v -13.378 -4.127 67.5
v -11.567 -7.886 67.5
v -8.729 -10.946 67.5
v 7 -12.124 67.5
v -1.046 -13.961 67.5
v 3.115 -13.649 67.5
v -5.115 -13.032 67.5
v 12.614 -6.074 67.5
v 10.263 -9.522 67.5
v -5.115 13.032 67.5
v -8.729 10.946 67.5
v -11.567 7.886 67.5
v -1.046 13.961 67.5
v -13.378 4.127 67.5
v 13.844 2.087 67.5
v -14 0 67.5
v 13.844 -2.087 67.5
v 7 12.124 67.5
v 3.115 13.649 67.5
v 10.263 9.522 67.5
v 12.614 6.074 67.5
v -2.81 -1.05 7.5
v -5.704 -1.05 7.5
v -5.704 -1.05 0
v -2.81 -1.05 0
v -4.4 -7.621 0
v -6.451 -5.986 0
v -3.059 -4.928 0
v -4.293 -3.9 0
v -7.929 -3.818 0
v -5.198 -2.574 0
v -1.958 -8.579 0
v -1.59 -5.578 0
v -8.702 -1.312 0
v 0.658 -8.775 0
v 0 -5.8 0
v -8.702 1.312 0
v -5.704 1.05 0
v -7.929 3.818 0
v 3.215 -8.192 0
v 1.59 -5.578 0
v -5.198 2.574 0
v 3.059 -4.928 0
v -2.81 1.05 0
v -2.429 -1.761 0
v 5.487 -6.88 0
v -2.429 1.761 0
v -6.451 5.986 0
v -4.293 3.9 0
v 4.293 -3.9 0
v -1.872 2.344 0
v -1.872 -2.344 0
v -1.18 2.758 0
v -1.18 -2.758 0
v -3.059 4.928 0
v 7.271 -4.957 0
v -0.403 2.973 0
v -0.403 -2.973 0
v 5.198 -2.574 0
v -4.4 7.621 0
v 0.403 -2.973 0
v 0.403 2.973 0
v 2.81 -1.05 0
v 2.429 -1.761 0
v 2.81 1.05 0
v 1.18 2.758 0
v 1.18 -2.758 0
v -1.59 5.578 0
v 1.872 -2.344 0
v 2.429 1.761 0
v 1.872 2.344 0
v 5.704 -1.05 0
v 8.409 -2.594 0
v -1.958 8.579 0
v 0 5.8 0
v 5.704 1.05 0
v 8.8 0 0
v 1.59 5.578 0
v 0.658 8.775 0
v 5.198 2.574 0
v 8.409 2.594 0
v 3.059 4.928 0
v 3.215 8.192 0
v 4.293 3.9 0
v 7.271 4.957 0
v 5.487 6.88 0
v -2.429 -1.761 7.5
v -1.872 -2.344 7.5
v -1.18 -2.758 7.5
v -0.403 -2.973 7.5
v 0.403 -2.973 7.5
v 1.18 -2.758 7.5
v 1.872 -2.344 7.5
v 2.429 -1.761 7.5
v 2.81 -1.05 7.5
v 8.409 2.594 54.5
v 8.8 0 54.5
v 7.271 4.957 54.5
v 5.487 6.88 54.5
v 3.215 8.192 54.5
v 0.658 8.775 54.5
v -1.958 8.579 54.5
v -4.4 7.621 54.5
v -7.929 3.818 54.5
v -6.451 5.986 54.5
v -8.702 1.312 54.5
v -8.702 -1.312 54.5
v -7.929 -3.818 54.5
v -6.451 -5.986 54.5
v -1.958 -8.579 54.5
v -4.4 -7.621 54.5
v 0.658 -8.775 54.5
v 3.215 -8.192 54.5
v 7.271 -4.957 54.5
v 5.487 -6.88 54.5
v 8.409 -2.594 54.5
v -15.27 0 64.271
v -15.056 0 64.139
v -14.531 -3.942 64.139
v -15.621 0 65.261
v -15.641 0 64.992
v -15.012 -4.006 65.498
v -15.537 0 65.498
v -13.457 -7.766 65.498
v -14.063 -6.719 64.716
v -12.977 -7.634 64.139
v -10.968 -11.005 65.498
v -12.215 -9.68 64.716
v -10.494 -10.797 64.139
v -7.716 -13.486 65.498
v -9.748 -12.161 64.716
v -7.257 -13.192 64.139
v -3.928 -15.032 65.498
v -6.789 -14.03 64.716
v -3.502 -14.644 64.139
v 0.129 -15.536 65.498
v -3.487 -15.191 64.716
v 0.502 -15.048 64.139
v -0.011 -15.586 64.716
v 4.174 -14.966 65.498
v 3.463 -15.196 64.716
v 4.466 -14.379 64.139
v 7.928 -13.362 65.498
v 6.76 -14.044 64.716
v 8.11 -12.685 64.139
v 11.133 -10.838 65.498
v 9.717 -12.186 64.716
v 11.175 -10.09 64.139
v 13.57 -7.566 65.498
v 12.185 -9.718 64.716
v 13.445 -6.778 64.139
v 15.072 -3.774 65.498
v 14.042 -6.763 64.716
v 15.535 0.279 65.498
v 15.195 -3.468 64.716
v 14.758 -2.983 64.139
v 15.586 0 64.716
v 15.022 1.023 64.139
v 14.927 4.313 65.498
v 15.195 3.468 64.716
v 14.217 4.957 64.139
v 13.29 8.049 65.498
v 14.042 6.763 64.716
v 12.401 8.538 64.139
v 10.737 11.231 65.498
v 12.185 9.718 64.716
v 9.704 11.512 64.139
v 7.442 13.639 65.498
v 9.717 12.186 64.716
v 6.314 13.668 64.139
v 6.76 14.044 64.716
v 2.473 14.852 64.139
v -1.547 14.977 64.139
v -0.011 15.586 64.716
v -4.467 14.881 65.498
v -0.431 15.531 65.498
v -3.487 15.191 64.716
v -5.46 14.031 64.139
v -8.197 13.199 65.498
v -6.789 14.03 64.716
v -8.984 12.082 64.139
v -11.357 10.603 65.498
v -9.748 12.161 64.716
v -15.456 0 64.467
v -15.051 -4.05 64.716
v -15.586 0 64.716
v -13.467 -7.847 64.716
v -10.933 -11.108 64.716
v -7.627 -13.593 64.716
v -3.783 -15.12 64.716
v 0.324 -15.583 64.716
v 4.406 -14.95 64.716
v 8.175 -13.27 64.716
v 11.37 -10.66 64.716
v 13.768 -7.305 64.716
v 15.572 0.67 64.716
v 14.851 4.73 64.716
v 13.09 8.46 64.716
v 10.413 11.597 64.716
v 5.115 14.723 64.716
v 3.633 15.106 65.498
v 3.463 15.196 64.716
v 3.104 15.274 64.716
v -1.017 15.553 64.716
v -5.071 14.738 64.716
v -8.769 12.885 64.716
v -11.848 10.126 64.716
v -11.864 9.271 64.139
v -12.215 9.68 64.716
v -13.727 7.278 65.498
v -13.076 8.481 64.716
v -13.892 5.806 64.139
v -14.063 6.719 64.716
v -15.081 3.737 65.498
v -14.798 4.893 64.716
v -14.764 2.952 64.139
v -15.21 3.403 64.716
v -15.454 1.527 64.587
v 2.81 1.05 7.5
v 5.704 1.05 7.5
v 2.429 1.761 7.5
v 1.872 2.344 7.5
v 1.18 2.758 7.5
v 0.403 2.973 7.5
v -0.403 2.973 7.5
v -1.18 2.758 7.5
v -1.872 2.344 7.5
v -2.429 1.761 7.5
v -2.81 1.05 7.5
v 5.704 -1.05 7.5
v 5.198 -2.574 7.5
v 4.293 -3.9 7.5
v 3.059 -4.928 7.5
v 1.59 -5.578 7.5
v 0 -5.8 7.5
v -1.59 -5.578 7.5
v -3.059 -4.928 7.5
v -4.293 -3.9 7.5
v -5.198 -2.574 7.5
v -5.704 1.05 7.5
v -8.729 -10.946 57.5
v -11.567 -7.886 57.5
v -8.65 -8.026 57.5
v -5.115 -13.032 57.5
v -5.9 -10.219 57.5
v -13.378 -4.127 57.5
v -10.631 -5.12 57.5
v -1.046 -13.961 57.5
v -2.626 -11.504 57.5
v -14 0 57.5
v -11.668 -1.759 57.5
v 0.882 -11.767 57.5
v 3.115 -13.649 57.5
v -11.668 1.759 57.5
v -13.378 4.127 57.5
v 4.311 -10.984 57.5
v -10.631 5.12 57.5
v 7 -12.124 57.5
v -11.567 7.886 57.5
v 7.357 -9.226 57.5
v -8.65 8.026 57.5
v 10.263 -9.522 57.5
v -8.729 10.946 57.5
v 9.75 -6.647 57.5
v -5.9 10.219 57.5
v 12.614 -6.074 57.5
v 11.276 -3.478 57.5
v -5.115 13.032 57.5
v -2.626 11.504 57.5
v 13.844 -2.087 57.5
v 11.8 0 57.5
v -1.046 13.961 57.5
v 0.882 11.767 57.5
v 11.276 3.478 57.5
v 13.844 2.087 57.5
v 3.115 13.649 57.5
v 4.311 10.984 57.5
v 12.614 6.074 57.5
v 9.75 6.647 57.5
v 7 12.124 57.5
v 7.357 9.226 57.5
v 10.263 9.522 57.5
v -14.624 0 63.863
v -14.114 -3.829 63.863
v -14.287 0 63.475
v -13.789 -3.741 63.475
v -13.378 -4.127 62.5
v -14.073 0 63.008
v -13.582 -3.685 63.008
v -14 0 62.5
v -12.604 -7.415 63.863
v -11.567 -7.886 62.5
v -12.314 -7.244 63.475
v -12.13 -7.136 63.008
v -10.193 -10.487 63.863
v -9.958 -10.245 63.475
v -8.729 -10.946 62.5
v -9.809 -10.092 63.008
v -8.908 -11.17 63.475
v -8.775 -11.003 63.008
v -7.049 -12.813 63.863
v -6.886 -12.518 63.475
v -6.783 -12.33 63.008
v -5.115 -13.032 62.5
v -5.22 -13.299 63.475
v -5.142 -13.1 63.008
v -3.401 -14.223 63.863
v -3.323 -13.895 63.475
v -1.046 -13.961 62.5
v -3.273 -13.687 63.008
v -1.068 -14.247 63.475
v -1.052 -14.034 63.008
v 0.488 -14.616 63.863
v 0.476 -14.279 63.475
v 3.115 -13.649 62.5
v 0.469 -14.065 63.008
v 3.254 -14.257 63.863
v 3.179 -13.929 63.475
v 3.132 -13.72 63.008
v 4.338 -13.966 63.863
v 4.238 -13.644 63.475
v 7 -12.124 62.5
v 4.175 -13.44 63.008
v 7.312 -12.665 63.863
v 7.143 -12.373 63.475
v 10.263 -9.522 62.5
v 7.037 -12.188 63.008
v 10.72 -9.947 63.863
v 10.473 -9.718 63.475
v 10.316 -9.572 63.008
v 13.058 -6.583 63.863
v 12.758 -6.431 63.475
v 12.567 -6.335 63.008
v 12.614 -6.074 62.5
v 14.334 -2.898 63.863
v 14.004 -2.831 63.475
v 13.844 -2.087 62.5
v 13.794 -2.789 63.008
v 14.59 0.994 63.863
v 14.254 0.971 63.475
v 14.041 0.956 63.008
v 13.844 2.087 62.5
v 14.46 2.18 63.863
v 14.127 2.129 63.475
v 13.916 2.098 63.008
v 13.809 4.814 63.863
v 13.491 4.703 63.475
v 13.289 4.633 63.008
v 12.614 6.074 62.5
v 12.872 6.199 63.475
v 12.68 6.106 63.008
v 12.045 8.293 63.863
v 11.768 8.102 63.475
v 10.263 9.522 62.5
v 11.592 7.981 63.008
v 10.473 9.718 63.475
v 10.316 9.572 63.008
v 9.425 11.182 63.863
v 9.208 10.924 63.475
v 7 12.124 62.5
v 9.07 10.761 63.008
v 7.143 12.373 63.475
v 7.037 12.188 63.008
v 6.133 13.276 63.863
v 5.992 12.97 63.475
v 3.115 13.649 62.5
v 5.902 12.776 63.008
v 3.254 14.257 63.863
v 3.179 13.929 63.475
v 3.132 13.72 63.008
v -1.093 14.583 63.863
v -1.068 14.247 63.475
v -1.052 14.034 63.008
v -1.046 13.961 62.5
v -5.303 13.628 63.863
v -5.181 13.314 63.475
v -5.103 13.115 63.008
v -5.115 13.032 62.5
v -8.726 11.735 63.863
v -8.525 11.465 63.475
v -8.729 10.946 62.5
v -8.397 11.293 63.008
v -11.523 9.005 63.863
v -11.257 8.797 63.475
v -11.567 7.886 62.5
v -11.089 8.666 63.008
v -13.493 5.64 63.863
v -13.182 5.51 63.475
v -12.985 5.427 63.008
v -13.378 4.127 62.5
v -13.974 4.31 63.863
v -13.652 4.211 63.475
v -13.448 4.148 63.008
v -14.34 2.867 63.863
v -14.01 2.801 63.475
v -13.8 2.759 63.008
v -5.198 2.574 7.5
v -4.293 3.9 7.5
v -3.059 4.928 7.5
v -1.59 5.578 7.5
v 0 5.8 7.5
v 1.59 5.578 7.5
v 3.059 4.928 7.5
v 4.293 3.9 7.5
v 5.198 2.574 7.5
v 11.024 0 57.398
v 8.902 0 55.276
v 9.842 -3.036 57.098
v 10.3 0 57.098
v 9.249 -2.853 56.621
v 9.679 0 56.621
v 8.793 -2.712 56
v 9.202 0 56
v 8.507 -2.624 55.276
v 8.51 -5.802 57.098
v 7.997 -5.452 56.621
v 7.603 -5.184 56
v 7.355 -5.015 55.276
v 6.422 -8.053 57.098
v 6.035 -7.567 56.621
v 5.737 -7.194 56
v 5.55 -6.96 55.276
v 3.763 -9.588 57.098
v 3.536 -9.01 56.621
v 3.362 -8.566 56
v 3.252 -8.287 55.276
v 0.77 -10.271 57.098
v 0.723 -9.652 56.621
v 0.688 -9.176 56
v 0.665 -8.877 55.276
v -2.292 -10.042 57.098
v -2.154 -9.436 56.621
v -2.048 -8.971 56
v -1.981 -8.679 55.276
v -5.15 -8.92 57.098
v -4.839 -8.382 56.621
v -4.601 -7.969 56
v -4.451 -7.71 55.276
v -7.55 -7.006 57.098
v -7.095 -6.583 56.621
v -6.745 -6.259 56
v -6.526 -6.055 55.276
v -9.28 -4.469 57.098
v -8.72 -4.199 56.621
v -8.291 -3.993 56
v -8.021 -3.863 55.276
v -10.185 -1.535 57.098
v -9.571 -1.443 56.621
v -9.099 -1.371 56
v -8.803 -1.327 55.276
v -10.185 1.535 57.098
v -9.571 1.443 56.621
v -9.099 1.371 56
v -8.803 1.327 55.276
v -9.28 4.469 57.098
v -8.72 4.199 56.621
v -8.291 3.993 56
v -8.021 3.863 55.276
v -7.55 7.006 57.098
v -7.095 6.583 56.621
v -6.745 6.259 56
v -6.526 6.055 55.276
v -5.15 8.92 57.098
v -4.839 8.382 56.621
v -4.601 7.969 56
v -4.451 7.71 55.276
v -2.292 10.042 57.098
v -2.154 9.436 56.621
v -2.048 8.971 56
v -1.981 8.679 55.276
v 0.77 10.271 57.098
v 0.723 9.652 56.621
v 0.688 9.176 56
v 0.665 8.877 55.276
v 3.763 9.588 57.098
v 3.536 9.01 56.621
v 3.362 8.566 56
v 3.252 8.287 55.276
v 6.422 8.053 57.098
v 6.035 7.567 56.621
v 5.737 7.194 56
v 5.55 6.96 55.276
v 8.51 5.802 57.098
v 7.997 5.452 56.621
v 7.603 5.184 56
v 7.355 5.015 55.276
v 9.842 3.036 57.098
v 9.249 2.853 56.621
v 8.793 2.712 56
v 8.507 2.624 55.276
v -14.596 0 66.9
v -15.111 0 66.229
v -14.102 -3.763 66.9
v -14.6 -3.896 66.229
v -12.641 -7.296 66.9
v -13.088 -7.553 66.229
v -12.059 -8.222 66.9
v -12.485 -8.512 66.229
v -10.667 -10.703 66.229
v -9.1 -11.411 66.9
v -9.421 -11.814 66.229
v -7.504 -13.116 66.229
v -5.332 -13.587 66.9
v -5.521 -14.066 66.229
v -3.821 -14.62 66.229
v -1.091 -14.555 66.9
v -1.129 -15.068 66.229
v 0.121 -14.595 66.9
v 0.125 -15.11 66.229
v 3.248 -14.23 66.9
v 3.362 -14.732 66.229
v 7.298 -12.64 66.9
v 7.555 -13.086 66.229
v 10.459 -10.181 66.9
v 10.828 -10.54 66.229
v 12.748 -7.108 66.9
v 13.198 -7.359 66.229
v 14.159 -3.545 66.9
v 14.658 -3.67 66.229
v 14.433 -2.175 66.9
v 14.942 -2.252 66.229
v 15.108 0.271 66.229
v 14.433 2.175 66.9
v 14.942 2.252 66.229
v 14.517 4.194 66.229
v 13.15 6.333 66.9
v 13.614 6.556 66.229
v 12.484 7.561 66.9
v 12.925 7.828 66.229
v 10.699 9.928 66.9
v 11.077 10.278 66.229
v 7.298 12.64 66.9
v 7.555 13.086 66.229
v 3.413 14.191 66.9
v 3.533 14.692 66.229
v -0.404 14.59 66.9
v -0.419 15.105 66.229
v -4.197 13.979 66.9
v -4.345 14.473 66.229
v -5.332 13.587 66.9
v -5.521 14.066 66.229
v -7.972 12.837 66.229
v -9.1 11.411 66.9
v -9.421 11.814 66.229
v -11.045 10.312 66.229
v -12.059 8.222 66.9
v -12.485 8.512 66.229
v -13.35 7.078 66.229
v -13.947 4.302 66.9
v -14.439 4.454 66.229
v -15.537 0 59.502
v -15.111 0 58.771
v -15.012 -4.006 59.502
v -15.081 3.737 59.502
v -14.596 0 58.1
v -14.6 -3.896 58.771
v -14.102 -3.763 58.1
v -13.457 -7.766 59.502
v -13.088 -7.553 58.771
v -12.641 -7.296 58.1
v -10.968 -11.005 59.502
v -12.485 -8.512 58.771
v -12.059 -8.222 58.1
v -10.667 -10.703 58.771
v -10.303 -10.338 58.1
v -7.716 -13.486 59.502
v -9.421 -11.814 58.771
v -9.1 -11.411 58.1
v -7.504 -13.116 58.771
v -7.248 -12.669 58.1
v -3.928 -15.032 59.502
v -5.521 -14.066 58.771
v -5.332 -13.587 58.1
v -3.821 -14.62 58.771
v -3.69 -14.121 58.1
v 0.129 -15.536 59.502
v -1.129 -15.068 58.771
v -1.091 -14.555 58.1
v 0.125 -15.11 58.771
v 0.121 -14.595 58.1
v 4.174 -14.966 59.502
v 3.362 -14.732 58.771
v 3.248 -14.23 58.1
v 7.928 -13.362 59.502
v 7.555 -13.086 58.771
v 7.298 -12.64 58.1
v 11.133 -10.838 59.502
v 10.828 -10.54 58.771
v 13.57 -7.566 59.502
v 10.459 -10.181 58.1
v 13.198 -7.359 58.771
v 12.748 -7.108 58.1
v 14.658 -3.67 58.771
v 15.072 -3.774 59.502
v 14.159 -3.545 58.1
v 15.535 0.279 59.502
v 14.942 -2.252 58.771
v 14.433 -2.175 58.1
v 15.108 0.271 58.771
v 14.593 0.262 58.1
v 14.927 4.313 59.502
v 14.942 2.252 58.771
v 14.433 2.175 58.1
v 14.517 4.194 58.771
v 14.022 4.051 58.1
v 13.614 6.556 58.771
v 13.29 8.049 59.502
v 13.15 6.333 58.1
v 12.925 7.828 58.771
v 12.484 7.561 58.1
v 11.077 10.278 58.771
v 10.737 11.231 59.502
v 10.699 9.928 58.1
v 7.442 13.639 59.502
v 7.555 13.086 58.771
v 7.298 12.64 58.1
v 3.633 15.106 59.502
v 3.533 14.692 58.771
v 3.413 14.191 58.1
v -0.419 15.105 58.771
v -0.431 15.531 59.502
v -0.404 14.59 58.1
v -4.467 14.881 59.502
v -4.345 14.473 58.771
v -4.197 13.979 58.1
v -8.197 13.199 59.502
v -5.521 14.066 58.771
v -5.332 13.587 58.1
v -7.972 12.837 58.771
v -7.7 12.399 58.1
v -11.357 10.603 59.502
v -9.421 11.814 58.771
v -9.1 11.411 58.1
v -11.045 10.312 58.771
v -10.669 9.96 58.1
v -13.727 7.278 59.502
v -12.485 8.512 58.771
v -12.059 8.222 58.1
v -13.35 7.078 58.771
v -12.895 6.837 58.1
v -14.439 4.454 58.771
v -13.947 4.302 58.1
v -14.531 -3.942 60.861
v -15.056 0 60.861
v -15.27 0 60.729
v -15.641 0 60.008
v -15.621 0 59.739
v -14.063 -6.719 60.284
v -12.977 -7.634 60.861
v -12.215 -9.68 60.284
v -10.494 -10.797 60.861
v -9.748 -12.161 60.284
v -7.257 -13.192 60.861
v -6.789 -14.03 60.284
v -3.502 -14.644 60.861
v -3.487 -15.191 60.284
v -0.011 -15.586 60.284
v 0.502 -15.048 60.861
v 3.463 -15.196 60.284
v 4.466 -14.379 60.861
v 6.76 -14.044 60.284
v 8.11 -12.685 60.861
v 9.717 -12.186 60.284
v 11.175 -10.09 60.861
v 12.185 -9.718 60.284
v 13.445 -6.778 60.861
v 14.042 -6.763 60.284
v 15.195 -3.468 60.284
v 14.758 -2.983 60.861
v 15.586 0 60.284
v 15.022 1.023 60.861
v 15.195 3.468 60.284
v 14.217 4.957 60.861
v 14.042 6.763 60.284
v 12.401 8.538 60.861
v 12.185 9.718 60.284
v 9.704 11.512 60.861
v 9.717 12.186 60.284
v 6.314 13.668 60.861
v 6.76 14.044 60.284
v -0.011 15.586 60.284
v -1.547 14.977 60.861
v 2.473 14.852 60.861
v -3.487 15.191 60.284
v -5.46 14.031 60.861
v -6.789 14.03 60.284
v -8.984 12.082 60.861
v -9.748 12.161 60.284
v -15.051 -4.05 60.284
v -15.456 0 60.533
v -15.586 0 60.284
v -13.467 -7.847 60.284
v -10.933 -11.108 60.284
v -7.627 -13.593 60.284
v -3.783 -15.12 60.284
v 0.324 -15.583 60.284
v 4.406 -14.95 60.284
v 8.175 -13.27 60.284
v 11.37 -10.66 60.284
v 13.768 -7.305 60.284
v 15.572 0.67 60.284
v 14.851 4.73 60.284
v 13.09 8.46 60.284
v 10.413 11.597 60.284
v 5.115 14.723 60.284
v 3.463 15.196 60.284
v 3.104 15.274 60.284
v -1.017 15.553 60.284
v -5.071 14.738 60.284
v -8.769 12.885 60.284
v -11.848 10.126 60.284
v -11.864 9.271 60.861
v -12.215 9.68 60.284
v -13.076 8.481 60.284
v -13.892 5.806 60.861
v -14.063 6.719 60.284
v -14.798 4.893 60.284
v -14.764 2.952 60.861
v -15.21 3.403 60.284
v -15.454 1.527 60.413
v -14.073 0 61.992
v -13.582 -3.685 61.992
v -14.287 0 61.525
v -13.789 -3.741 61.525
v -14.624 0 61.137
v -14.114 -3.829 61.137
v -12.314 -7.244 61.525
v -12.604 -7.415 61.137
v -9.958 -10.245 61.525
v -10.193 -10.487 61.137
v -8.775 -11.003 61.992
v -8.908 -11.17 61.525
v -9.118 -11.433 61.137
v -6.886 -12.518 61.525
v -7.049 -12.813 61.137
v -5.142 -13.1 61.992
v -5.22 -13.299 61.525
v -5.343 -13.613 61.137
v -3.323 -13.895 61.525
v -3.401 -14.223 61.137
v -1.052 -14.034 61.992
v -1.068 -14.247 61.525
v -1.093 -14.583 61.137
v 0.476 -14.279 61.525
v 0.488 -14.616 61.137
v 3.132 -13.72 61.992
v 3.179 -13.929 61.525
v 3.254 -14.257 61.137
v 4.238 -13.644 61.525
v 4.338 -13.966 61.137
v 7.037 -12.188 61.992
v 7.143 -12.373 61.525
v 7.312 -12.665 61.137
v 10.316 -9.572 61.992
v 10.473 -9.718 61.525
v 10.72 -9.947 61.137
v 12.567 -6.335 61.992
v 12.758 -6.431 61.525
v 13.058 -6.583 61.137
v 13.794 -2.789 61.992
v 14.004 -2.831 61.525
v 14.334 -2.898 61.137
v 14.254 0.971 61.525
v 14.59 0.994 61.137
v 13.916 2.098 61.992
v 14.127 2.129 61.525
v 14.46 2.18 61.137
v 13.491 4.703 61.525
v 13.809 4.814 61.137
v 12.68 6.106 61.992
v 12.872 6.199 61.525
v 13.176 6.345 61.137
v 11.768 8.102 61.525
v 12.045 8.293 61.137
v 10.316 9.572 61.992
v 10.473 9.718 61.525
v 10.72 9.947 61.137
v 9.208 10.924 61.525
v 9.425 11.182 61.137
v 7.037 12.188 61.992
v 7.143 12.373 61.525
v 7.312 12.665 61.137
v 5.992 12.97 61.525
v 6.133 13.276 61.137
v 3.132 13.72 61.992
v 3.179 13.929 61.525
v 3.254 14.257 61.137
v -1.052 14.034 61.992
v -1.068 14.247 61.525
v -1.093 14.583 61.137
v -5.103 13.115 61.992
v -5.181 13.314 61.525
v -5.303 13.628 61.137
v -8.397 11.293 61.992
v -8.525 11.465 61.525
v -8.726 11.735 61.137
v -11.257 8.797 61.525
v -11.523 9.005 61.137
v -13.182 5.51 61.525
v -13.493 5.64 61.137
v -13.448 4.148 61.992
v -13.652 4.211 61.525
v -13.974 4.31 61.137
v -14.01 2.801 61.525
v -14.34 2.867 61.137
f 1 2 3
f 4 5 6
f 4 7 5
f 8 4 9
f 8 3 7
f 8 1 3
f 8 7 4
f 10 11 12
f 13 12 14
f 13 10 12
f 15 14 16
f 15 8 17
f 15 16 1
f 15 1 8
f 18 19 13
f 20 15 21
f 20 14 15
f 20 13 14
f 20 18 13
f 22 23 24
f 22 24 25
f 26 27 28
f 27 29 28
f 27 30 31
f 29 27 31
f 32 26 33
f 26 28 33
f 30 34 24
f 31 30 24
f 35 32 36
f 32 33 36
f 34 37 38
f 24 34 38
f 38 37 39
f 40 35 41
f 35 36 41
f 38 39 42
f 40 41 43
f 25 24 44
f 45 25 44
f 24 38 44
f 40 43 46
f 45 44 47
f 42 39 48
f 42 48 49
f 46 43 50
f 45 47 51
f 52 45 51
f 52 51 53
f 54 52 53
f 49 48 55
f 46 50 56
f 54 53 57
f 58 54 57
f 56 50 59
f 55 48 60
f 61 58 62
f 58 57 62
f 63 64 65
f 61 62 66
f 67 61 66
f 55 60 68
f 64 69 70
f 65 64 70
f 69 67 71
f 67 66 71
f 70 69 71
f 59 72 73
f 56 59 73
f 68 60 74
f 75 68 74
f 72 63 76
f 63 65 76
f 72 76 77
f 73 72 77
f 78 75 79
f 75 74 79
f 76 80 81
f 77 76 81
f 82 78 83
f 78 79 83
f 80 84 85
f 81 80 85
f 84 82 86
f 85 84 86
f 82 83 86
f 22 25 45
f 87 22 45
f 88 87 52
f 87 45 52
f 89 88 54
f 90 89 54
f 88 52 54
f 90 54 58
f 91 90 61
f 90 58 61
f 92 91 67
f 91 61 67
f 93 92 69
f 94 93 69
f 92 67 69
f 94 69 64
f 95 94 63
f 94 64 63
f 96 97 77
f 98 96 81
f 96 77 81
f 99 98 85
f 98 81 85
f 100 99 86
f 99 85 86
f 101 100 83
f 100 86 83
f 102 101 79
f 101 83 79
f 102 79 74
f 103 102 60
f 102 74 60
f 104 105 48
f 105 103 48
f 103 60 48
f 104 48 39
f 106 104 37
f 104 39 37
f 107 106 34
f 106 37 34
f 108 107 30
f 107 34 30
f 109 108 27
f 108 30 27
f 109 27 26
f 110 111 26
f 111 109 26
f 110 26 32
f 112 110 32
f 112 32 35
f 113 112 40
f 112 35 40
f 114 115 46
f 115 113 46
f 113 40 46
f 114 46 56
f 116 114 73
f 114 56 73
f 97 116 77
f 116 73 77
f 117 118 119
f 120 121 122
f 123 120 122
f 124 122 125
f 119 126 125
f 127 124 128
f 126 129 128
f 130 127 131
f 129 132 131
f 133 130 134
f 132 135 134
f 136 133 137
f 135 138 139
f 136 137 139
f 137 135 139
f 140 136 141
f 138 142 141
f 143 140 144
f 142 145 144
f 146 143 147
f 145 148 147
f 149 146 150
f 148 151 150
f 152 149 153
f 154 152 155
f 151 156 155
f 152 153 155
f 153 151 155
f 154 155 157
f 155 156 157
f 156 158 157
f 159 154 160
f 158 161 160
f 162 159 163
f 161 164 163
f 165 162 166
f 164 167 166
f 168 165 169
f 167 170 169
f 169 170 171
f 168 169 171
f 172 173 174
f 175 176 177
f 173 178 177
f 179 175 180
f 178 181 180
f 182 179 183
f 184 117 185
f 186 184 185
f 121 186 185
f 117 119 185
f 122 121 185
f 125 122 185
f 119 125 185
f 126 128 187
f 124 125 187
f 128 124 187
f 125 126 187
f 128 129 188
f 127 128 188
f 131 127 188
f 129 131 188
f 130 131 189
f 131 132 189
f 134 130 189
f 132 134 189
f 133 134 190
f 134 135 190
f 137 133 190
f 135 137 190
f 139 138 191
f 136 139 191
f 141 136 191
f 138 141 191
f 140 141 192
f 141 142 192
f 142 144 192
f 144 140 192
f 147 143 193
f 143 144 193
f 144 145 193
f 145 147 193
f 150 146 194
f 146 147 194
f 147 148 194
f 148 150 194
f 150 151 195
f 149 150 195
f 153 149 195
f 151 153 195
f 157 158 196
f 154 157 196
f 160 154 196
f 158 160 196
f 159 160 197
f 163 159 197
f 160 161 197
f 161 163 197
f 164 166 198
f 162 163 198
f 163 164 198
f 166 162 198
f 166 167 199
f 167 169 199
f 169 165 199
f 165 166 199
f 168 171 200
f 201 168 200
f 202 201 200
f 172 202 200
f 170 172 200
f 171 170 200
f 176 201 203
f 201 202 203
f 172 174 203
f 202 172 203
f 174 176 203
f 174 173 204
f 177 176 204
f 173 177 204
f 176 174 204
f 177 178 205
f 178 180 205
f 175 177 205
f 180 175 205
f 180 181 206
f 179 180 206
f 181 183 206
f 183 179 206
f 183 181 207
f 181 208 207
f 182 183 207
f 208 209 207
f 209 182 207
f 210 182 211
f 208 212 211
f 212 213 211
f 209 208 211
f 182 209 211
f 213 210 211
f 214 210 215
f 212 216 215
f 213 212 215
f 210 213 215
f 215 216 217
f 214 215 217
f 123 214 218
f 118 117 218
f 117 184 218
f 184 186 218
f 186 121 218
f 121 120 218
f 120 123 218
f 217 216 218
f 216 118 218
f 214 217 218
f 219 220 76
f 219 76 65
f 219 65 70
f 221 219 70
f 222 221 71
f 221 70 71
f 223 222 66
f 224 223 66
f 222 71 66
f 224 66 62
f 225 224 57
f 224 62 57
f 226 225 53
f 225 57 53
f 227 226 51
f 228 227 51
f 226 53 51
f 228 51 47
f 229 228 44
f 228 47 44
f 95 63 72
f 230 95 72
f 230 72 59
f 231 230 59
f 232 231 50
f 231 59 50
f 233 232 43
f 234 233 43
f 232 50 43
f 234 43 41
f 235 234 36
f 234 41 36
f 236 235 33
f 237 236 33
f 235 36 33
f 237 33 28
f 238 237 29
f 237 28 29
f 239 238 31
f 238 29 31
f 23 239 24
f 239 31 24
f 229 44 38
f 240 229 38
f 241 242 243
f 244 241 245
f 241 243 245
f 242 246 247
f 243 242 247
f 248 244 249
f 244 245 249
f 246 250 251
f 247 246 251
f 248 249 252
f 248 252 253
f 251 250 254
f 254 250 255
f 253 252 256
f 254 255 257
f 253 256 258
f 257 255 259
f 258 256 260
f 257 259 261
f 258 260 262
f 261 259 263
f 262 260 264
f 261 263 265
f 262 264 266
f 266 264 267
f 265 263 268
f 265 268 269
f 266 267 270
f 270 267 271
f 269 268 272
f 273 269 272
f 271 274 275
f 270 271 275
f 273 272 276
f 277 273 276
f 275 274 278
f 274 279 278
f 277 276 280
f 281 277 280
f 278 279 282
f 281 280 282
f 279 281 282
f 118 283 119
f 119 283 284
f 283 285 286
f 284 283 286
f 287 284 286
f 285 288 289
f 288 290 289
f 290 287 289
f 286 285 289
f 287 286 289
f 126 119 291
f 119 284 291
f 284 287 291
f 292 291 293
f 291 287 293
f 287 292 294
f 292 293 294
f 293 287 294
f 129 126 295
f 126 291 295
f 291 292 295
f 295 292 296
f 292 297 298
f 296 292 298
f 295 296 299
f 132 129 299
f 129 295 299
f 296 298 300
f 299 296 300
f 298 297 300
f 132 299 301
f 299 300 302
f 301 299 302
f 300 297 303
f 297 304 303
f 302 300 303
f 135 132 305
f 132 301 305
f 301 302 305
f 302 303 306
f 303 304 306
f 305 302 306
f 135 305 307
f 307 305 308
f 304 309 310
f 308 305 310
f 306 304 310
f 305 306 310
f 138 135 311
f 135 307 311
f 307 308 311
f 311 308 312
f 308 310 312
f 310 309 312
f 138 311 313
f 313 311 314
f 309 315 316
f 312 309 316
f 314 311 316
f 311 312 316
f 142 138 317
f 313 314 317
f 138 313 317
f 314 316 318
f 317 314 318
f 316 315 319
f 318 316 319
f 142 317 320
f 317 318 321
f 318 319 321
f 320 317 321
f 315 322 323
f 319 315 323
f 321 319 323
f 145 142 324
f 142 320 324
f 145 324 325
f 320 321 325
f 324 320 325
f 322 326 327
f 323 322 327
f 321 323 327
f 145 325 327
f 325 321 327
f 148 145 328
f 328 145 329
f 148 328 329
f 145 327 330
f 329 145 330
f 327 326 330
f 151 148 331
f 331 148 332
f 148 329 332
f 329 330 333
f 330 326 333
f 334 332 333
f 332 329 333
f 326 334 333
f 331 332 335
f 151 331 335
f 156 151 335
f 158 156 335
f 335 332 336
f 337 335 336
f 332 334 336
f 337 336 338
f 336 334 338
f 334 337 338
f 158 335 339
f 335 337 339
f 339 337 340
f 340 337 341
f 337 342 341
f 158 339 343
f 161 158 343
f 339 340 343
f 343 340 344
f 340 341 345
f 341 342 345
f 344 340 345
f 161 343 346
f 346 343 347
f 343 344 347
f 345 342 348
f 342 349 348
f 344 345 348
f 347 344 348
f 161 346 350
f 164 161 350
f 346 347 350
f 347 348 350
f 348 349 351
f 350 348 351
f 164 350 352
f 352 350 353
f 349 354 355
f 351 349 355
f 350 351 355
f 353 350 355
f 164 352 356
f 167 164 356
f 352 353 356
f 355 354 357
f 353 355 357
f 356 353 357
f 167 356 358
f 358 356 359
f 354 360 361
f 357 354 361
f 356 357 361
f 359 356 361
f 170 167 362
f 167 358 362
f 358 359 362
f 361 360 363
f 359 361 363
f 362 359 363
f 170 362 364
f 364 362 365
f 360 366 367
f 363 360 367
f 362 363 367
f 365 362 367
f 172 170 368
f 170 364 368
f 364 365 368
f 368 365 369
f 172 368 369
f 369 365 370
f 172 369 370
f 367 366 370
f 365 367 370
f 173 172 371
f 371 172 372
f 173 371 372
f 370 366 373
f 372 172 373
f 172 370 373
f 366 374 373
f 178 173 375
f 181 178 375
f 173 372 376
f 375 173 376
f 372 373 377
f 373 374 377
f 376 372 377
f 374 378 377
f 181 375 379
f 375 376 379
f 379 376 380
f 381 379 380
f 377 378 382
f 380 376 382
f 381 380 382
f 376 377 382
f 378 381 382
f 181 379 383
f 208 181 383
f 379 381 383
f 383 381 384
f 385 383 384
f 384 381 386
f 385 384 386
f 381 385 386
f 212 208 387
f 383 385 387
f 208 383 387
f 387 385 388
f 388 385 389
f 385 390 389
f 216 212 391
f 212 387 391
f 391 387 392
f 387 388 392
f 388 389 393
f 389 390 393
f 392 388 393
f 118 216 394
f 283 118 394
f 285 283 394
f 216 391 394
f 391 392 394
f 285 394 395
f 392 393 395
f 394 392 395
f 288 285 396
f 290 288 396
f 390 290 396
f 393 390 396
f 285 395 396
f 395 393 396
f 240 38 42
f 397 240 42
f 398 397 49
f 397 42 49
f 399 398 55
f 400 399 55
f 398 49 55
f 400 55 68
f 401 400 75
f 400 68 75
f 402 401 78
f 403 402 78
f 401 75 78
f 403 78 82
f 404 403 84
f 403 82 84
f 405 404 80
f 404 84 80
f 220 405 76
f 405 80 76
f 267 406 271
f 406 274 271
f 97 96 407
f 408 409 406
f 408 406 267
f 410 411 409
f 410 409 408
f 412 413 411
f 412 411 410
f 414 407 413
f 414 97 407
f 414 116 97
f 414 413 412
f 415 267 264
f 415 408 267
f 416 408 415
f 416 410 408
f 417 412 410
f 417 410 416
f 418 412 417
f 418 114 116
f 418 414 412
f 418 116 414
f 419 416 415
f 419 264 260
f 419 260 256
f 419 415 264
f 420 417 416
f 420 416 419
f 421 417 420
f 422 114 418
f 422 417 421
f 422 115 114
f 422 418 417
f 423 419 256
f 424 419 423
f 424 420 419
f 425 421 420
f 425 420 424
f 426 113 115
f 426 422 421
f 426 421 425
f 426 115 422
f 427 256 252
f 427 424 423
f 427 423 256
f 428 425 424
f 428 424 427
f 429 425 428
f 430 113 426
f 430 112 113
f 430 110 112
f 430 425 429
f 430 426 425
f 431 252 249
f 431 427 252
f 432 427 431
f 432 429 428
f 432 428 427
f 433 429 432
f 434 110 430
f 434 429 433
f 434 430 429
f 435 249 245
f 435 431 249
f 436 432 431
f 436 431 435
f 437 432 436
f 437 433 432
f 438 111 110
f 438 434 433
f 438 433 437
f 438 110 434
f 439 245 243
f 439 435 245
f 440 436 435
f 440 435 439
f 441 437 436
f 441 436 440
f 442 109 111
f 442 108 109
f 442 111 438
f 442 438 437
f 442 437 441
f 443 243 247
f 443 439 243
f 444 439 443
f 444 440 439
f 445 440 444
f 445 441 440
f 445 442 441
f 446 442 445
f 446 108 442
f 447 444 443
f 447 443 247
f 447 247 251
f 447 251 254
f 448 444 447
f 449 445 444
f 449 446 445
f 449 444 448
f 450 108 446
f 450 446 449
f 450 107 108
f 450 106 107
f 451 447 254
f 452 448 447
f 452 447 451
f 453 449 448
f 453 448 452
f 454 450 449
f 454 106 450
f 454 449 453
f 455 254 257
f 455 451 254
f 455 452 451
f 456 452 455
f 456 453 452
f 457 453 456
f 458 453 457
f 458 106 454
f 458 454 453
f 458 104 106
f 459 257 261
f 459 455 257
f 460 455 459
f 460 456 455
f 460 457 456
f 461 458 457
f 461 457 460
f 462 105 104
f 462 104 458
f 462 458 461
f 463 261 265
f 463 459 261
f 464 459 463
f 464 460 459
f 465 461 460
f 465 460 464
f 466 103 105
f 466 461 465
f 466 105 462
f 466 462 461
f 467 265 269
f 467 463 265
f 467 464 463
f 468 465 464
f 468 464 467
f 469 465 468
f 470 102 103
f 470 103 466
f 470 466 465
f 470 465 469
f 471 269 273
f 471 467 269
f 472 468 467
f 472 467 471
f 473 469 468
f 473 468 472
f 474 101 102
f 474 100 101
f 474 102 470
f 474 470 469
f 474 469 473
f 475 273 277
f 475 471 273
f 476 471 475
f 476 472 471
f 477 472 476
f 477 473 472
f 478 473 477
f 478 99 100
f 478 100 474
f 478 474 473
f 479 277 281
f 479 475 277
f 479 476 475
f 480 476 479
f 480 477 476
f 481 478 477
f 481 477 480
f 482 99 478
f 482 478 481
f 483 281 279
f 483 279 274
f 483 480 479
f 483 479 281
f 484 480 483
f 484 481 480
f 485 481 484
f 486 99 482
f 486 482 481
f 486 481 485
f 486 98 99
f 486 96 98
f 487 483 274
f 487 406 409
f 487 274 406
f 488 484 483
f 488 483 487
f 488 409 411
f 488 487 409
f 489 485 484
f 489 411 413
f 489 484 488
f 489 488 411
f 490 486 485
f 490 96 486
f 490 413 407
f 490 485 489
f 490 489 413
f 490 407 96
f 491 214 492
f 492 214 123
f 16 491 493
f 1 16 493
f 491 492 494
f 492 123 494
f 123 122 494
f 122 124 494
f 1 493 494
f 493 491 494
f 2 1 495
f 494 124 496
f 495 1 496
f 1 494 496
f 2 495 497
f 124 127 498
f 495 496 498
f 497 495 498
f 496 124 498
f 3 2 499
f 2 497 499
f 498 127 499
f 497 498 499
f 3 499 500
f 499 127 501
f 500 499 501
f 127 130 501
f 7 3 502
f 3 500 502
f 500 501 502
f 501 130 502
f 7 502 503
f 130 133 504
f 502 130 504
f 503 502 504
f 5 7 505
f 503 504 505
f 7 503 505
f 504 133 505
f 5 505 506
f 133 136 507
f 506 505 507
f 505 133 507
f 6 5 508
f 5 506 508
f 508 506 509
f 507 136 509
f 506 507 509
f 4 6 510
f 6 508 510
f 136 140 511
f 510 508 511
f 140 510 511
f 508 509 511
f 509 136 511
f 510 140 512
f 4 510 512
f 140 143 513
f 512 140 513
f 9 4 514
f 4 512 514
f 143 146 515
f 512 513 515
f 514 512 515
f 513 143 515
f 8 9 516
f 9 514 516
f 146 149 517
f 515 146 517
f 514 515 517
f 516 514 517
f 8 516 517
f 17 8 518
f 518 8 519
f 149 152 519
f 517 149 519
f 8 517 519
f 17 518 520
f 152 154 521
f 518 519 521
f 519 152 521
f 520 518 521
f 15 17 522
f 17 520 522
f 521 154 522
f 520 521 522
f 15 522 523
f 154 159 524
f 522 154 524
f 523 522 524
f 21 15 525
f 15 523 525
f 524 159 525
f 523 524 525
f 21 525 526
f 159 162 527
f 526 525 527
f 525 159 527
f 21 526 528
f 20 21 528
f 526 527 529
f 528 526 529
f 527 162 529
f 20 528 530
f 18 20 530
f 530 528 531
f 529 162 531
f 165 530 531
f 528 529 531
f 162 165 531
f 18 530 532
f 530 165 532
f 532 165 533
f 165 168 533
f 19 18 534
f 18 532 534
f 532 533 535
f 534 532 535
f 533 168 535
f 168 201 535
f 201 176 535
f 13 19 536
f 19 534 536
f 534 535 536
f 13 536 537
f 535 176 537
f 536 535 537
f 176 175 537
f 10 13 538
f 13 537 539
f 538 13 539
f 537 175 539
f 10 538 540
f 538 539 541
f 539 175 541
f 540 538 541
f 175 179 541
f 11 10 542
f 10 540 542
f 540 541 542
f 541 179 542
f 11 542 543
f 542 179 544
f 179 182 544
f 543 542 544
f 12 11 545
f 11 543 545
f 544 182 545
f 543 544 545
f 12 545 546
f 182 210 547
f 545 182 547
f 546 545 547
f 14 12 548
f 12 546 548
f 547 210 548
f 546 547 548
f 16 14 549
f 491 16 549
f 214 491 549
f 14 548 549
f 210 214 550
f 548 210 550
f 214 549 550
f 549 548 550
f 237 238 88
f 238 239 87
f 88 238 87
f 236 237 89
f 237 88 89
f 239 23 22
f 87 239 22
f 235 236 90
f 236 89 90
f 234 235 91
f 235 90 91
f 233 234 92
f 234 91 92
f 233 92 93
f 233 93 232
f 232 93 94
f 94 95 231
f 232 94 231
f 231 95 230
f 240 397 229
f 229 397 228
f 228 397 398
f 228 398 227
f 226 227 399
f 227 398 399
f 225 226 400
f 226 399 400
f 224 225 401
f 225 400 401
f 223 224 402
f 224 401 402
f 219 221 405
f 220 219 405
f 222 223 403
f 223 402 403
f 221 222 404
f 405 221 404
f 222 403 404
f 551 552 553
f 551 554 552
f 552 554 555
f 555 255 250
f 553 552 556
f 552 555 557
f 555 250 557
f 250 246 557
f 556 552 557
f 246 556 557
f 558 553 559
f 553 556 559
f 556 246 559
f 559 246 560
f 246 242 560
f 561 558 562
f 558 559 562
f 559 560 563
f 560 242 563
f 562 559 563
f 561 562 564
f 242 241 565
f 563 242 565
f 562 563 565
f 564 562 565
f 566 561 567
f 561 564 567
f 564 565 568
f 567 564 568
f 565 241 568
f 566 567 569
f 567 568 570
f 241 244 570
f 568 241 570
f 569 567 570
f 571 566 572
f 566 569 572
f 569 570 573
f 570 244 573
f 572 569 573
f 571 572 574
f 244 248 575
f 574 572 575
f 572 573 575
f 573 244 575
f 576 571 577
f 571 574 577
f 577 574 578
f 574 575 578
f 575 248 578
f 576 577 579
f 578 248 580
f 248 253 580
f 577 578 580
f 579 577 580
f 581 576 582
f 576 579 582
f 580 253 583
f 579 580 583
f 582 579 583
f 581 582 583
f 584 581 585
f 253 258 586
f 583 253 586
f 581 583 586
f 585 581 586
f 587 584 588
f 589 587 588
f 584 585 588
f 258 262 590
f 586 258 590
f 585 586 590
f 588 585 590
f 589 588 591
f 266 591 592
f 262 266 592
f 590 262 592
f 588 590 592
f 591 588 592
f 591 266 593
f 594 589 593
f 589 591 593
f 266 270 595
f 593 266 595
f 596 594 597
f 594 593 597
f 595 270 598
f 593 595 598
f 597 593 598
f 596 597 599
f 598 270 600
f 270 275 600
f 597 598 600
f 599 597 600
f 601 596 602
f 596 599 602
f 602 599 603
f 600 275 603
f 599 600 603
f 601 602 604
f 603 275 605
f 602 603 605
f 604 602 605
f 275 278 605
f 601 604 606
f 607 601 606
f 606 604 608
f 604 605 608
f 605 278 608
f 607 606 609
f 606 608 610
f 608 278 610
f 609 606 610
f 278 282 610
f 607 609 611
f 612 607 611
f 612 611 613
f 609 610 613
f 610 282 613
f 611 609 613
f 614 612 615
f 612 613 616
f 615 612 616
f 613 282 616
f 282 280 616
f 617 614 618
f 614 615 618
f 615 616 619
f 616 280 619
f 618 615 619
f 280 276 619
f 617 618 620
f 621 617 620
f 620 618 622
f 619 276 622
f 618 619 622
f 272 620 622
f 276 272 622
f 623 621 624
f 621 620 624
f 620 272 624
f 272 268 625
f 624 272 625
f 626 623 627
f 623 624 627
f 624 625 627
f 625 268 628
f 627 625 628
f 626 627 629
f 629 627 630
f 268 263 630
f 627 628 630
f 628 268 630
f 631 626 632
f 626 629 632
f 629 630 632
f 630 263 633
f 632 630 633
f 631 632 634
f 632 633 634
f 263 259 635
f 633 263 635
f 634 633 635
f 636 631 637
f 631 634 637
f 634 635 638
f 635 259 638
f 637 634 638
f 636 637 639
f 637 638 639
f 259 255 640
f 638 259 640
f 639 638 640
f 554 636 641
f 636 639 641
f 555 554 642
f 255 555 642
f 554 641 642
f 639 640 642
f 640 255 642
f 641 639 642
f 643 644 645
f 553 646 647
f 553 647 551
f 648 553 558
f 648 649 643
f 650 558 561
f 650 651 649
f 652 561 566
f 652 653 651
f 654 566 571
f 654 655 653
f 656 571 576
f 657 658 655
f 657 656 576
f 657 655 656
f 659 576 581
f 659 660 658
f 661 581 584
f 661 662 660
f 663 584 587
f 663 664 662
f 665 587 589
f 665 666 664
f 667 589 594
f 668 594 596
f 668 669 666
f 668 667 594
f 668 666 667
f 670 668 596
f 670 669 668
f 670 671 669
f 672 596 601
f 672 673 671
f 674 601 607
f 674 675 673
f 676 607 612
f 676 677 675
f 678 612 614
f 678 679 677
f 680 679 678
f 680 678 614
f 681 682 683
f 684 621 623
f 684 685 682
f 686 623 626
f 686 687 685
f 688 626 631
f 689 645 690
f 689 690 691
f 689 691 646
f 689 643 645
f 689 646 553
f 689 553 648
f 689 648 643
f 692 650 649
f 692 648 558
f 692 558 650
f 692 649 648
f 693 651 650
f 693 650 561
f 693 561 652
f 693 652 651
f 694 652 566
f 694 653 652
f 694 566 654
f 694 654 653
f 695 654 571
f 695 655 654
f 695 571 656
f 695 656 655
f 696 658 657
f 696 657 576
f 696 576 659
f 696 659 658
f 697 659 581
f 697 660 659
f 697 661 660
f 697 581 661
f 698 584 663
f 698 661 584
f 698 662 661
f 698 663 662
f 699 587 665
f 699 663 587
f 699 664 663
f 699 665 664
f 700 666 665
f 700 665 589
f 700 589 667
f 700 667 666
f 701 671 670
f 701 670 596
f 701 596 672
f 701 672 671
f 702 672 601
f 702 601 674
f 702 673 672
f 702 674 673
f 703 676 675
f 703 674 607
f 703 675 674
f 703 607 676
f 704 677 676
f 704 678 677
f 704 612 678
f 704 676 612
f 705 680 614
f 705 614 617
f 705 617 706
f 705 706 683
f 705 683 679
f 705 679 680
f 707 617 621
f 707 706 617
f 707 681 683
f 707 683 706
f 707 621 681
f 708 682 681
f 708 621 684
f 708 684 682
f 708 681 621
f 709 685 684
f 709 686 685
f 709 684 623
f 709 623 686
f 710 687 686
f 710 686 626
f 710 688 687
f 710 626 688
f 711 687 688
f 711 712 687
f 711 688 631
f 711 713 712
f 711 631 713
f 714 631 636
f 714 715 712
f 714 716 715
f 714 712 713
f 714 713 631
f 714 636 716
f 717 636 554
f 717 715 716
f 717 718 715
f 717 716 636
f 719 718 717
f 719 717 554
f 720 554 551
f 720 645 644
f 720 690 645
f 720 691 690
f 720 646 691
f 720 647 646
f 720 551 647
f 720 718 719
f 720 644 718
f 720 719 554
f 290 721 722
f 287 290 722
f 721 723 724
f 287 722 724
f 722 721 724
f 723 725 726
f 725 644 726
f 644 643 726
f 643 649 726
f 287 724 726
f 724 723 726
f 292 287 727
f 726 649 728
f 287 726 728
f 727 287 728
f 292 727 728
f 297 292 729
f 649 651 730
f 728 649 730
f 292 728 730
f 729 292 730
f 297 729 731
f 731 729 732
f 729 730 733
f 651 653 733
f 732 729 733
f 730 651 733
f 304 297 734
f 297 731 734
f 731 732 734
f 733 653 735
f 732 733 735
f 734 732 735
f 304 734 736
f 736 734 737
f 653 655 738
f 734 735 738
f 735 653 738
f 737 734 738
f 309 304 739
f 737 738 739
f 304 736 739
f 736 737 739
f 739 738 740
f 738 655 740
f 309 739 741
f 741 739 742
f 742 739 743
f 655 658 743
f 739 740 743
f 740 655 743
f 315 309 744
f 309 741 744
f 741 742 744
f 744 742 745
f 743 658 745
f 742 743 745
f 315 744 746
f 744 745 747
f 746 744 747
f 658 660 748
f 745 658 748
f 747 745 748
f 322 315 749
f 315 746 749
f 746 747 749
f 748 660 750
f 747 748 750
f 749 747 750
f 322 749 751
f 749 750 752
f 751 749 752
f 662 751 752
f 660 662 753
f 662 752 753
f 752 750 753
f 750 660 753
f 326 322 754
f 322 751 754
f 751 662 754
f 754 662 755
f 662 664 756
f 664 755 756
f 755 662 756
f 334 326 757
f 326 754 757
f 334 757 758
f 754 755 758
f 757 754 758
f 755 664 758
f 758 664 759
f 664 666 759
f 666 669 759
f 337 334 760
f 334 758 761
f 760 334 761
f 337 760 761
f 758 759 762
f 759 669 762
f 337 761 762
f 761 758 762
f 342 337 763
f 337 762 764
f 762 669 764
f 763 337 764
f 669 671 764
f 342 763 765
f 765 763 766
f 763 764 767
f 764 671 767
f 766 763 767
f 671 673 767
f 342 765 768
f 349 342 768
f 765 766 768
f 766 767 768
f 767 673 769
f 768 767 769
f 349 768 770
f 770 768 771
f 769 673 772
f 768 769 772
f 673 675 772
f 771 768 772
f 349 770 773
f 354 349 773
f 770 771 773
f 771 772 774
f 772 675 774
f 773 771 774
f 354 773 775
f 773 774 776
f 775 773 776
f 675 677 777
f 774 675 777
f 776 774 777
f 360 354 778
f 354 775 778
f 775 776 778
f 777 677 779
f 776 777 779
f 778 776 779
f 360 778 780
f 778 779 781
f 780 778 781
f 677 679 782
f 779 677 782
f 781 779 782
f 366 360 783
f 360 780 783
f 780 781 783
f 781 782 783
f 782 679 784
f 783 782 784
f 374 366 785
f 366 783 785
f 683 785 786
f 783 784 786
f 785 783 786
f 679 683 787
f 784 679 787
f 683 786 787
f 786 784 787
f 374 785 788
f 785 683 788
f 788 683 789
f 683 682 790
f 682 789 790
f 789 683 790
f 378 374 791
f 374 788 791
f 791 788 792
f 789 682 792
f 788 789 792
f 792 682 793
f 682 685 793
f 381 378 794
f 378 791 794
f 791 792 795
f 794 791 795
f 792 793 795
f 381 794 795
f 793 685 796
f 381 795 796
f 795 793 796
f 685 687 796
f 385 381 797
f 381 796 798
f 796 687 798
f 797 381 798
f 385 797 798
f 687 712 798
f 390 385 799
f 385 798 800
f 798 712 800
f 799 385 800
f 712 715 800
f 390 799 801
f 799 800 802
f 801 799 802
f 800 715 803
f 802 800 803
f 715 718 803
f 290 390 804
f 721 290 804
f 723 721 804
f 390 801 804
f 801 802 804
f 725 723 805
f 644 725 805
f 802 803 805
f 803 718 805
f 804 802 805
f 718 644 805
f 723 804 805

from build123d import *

# Parameters (mm, degrees)
F0_R     = 8.8
F1_DEPTH = 7.5
F2_R     = 8.8
F3_DEPTH = 55
F4_R     = 14
F4_R_2   = 8.8
F5_DEPTH = 5
F8_R     = 1
F9_R     = 3


with BuildPart() as f1:
    # F0 (on Top) → F1 (new body)
    with BuildSketch(Plane.XY):
        Circle(F0_R)
        with BuildLine():
            ThreePointArc((5.7041651449, -1.05), (0, -5.8), (-5.7041651449, -1.05))
            Line((-5.7041651449, -1.05), (-2.8102490993, -1.05))
            ThreePointArc((-2.8102490993, -1.05), (0, -3), (2.8102490993, -1.05))
            Line((2.8102490993, -1.05), (5.7041651449, -1.05))
        make_face(mode=Mode.SUBTRACT)
        with BuildLine():
            ThreePointArc((-5.7041651449, 1.05), (0, 5.8), (5.7041651449, 1.05))
            Line((5.7041651449, 1.05), (2.8102490993, 1.05))
            ThreePointArc((2.8102490993, 1.05), (0, 3), (-2.8102490993, 1.05))
            Line((-2.8102490993, 1.05), (-5.7041651449, 1.05))
        make_face(mode=Mode.SUBTRACT)
    extrude(amount=F1_DEPTH)

    # F2 (on face) → F3 (join)
    with BuildSketch(Plane.XY.offset(7.5)):
        Circle(F2_R)
        with BuildLine():
            Line((2.8102490993, -1.05), (5.7041651449, -1.05))
            ThreePointArc((5.7041651449, -1.05), (0, -5.8), (-5.7041651449, -1.05))
            Line((-5.7041651449, -1.05), (-2.8102490993, -1.05))
            ThreePointArc((-2.8102490993, -1.05), (0, -3), (2.8102490993, -1.05))
        make_face(mode=Mode.SUBTRACT)
        with BuildLine():
            ThreePointArc((-5.7041651449, 1.05), (0, 5.8), (5.7041651449, 1.05))
            Line((5.7041651449, 1.05), (2.8102490993, 1.05))
            ThreePointArc((2.8102490993, 1.05), (0, 3), (-2.8102490993, 1.05))
            Line((-2.8102490993, 1.05), (-5.7041651449, 1.05))
        make_face(mode=Mode.SUBTRACT)
        with BuildLine():
            Line((2.8102490993, 1.05), (5.7041651449, 1.05))
            ThreePointArc((5.7041651449, 1.05), (0, 5.8), (-5.7041651449, 1.05))
            Line((-5.7041651449, 1.05), (-2.8102490993, 1.05))
            ThreePointArc((-2.8102490993, 1.05), (0, 3), (2.8102490993, 1.05))
        make_face()
        with BuildLine():
            ThreePointArc((-5.7041651449, -1.05), (0, -5.8), (5.7041651449, -1.05))
            Line((5.7041651449, -1.05), (2.8102490993, -1.05))
            ThreePointArc((2.8102490993, -1.05), (0, -3), (-2.8102490993, -1.05))
            Line((-2.8102490993, -1.05), (-5.7041651449, -1.05))
        make_face()
    extrude(amount=F3_DEPTH)

    # F4 (on face) → F5 (join, symmetric)
    with BuildSketch(Plane.XY.offset(62.5)):
        Circle(F4_R)
        Circle(F4_R_2, mode=Mode.SUBTRACT)
        Circle(F4_R_2)
    extrude(amount=F5_DEPTH, both=True)

    # F6 (on Front) → F7 (revolve)
    with BuildSketch(Plane.XZ):
        with BuildLine():
            ThreePointArc((-16.0032685947, 64.2884859179), (-14.6012263497, 63.8427366589), (-14, 62.5))
            Line((-14, 62.5), (-14, 67.5))
            ThreePointArc((-14, 67.5), (-15.2336171199, 66.0389485063), (-16.0032685947, 64.2884859179))
        make_face()
        with BuildLine():
            ThreePointArc((-16.0032685947, 60.7115140821), (-15.2336171199, 58.9610514937), (-14, 57.5))
            Line((-14, 57.5), (-14, 62.5))
            ThreePointArc((-14, 62.5), (-14.6012263497, 61.1572633411), (-16.0032685947, 60.7115140821))
        make_face()
    revolve(axis=Axis((0, 0, 35.6552451849), (0, 0, 1)))

    # F8
    f8_edges = [f1.edges().sort_by_distance(p)[0] for p in [
        (16.003269, 0, 64.288486),
        (16.003269, 0, 60.711514),
    ]]
    fillet(f8_edges, radius=F8_R)

    # F9
    f9_edges = [f1.edges().sort_by_distance(p)[0] for p in [
        (-8.8, 0, 57.5),
    ]]
    fillet(f9_edges, radius=F9_R)


solid = f1.part
